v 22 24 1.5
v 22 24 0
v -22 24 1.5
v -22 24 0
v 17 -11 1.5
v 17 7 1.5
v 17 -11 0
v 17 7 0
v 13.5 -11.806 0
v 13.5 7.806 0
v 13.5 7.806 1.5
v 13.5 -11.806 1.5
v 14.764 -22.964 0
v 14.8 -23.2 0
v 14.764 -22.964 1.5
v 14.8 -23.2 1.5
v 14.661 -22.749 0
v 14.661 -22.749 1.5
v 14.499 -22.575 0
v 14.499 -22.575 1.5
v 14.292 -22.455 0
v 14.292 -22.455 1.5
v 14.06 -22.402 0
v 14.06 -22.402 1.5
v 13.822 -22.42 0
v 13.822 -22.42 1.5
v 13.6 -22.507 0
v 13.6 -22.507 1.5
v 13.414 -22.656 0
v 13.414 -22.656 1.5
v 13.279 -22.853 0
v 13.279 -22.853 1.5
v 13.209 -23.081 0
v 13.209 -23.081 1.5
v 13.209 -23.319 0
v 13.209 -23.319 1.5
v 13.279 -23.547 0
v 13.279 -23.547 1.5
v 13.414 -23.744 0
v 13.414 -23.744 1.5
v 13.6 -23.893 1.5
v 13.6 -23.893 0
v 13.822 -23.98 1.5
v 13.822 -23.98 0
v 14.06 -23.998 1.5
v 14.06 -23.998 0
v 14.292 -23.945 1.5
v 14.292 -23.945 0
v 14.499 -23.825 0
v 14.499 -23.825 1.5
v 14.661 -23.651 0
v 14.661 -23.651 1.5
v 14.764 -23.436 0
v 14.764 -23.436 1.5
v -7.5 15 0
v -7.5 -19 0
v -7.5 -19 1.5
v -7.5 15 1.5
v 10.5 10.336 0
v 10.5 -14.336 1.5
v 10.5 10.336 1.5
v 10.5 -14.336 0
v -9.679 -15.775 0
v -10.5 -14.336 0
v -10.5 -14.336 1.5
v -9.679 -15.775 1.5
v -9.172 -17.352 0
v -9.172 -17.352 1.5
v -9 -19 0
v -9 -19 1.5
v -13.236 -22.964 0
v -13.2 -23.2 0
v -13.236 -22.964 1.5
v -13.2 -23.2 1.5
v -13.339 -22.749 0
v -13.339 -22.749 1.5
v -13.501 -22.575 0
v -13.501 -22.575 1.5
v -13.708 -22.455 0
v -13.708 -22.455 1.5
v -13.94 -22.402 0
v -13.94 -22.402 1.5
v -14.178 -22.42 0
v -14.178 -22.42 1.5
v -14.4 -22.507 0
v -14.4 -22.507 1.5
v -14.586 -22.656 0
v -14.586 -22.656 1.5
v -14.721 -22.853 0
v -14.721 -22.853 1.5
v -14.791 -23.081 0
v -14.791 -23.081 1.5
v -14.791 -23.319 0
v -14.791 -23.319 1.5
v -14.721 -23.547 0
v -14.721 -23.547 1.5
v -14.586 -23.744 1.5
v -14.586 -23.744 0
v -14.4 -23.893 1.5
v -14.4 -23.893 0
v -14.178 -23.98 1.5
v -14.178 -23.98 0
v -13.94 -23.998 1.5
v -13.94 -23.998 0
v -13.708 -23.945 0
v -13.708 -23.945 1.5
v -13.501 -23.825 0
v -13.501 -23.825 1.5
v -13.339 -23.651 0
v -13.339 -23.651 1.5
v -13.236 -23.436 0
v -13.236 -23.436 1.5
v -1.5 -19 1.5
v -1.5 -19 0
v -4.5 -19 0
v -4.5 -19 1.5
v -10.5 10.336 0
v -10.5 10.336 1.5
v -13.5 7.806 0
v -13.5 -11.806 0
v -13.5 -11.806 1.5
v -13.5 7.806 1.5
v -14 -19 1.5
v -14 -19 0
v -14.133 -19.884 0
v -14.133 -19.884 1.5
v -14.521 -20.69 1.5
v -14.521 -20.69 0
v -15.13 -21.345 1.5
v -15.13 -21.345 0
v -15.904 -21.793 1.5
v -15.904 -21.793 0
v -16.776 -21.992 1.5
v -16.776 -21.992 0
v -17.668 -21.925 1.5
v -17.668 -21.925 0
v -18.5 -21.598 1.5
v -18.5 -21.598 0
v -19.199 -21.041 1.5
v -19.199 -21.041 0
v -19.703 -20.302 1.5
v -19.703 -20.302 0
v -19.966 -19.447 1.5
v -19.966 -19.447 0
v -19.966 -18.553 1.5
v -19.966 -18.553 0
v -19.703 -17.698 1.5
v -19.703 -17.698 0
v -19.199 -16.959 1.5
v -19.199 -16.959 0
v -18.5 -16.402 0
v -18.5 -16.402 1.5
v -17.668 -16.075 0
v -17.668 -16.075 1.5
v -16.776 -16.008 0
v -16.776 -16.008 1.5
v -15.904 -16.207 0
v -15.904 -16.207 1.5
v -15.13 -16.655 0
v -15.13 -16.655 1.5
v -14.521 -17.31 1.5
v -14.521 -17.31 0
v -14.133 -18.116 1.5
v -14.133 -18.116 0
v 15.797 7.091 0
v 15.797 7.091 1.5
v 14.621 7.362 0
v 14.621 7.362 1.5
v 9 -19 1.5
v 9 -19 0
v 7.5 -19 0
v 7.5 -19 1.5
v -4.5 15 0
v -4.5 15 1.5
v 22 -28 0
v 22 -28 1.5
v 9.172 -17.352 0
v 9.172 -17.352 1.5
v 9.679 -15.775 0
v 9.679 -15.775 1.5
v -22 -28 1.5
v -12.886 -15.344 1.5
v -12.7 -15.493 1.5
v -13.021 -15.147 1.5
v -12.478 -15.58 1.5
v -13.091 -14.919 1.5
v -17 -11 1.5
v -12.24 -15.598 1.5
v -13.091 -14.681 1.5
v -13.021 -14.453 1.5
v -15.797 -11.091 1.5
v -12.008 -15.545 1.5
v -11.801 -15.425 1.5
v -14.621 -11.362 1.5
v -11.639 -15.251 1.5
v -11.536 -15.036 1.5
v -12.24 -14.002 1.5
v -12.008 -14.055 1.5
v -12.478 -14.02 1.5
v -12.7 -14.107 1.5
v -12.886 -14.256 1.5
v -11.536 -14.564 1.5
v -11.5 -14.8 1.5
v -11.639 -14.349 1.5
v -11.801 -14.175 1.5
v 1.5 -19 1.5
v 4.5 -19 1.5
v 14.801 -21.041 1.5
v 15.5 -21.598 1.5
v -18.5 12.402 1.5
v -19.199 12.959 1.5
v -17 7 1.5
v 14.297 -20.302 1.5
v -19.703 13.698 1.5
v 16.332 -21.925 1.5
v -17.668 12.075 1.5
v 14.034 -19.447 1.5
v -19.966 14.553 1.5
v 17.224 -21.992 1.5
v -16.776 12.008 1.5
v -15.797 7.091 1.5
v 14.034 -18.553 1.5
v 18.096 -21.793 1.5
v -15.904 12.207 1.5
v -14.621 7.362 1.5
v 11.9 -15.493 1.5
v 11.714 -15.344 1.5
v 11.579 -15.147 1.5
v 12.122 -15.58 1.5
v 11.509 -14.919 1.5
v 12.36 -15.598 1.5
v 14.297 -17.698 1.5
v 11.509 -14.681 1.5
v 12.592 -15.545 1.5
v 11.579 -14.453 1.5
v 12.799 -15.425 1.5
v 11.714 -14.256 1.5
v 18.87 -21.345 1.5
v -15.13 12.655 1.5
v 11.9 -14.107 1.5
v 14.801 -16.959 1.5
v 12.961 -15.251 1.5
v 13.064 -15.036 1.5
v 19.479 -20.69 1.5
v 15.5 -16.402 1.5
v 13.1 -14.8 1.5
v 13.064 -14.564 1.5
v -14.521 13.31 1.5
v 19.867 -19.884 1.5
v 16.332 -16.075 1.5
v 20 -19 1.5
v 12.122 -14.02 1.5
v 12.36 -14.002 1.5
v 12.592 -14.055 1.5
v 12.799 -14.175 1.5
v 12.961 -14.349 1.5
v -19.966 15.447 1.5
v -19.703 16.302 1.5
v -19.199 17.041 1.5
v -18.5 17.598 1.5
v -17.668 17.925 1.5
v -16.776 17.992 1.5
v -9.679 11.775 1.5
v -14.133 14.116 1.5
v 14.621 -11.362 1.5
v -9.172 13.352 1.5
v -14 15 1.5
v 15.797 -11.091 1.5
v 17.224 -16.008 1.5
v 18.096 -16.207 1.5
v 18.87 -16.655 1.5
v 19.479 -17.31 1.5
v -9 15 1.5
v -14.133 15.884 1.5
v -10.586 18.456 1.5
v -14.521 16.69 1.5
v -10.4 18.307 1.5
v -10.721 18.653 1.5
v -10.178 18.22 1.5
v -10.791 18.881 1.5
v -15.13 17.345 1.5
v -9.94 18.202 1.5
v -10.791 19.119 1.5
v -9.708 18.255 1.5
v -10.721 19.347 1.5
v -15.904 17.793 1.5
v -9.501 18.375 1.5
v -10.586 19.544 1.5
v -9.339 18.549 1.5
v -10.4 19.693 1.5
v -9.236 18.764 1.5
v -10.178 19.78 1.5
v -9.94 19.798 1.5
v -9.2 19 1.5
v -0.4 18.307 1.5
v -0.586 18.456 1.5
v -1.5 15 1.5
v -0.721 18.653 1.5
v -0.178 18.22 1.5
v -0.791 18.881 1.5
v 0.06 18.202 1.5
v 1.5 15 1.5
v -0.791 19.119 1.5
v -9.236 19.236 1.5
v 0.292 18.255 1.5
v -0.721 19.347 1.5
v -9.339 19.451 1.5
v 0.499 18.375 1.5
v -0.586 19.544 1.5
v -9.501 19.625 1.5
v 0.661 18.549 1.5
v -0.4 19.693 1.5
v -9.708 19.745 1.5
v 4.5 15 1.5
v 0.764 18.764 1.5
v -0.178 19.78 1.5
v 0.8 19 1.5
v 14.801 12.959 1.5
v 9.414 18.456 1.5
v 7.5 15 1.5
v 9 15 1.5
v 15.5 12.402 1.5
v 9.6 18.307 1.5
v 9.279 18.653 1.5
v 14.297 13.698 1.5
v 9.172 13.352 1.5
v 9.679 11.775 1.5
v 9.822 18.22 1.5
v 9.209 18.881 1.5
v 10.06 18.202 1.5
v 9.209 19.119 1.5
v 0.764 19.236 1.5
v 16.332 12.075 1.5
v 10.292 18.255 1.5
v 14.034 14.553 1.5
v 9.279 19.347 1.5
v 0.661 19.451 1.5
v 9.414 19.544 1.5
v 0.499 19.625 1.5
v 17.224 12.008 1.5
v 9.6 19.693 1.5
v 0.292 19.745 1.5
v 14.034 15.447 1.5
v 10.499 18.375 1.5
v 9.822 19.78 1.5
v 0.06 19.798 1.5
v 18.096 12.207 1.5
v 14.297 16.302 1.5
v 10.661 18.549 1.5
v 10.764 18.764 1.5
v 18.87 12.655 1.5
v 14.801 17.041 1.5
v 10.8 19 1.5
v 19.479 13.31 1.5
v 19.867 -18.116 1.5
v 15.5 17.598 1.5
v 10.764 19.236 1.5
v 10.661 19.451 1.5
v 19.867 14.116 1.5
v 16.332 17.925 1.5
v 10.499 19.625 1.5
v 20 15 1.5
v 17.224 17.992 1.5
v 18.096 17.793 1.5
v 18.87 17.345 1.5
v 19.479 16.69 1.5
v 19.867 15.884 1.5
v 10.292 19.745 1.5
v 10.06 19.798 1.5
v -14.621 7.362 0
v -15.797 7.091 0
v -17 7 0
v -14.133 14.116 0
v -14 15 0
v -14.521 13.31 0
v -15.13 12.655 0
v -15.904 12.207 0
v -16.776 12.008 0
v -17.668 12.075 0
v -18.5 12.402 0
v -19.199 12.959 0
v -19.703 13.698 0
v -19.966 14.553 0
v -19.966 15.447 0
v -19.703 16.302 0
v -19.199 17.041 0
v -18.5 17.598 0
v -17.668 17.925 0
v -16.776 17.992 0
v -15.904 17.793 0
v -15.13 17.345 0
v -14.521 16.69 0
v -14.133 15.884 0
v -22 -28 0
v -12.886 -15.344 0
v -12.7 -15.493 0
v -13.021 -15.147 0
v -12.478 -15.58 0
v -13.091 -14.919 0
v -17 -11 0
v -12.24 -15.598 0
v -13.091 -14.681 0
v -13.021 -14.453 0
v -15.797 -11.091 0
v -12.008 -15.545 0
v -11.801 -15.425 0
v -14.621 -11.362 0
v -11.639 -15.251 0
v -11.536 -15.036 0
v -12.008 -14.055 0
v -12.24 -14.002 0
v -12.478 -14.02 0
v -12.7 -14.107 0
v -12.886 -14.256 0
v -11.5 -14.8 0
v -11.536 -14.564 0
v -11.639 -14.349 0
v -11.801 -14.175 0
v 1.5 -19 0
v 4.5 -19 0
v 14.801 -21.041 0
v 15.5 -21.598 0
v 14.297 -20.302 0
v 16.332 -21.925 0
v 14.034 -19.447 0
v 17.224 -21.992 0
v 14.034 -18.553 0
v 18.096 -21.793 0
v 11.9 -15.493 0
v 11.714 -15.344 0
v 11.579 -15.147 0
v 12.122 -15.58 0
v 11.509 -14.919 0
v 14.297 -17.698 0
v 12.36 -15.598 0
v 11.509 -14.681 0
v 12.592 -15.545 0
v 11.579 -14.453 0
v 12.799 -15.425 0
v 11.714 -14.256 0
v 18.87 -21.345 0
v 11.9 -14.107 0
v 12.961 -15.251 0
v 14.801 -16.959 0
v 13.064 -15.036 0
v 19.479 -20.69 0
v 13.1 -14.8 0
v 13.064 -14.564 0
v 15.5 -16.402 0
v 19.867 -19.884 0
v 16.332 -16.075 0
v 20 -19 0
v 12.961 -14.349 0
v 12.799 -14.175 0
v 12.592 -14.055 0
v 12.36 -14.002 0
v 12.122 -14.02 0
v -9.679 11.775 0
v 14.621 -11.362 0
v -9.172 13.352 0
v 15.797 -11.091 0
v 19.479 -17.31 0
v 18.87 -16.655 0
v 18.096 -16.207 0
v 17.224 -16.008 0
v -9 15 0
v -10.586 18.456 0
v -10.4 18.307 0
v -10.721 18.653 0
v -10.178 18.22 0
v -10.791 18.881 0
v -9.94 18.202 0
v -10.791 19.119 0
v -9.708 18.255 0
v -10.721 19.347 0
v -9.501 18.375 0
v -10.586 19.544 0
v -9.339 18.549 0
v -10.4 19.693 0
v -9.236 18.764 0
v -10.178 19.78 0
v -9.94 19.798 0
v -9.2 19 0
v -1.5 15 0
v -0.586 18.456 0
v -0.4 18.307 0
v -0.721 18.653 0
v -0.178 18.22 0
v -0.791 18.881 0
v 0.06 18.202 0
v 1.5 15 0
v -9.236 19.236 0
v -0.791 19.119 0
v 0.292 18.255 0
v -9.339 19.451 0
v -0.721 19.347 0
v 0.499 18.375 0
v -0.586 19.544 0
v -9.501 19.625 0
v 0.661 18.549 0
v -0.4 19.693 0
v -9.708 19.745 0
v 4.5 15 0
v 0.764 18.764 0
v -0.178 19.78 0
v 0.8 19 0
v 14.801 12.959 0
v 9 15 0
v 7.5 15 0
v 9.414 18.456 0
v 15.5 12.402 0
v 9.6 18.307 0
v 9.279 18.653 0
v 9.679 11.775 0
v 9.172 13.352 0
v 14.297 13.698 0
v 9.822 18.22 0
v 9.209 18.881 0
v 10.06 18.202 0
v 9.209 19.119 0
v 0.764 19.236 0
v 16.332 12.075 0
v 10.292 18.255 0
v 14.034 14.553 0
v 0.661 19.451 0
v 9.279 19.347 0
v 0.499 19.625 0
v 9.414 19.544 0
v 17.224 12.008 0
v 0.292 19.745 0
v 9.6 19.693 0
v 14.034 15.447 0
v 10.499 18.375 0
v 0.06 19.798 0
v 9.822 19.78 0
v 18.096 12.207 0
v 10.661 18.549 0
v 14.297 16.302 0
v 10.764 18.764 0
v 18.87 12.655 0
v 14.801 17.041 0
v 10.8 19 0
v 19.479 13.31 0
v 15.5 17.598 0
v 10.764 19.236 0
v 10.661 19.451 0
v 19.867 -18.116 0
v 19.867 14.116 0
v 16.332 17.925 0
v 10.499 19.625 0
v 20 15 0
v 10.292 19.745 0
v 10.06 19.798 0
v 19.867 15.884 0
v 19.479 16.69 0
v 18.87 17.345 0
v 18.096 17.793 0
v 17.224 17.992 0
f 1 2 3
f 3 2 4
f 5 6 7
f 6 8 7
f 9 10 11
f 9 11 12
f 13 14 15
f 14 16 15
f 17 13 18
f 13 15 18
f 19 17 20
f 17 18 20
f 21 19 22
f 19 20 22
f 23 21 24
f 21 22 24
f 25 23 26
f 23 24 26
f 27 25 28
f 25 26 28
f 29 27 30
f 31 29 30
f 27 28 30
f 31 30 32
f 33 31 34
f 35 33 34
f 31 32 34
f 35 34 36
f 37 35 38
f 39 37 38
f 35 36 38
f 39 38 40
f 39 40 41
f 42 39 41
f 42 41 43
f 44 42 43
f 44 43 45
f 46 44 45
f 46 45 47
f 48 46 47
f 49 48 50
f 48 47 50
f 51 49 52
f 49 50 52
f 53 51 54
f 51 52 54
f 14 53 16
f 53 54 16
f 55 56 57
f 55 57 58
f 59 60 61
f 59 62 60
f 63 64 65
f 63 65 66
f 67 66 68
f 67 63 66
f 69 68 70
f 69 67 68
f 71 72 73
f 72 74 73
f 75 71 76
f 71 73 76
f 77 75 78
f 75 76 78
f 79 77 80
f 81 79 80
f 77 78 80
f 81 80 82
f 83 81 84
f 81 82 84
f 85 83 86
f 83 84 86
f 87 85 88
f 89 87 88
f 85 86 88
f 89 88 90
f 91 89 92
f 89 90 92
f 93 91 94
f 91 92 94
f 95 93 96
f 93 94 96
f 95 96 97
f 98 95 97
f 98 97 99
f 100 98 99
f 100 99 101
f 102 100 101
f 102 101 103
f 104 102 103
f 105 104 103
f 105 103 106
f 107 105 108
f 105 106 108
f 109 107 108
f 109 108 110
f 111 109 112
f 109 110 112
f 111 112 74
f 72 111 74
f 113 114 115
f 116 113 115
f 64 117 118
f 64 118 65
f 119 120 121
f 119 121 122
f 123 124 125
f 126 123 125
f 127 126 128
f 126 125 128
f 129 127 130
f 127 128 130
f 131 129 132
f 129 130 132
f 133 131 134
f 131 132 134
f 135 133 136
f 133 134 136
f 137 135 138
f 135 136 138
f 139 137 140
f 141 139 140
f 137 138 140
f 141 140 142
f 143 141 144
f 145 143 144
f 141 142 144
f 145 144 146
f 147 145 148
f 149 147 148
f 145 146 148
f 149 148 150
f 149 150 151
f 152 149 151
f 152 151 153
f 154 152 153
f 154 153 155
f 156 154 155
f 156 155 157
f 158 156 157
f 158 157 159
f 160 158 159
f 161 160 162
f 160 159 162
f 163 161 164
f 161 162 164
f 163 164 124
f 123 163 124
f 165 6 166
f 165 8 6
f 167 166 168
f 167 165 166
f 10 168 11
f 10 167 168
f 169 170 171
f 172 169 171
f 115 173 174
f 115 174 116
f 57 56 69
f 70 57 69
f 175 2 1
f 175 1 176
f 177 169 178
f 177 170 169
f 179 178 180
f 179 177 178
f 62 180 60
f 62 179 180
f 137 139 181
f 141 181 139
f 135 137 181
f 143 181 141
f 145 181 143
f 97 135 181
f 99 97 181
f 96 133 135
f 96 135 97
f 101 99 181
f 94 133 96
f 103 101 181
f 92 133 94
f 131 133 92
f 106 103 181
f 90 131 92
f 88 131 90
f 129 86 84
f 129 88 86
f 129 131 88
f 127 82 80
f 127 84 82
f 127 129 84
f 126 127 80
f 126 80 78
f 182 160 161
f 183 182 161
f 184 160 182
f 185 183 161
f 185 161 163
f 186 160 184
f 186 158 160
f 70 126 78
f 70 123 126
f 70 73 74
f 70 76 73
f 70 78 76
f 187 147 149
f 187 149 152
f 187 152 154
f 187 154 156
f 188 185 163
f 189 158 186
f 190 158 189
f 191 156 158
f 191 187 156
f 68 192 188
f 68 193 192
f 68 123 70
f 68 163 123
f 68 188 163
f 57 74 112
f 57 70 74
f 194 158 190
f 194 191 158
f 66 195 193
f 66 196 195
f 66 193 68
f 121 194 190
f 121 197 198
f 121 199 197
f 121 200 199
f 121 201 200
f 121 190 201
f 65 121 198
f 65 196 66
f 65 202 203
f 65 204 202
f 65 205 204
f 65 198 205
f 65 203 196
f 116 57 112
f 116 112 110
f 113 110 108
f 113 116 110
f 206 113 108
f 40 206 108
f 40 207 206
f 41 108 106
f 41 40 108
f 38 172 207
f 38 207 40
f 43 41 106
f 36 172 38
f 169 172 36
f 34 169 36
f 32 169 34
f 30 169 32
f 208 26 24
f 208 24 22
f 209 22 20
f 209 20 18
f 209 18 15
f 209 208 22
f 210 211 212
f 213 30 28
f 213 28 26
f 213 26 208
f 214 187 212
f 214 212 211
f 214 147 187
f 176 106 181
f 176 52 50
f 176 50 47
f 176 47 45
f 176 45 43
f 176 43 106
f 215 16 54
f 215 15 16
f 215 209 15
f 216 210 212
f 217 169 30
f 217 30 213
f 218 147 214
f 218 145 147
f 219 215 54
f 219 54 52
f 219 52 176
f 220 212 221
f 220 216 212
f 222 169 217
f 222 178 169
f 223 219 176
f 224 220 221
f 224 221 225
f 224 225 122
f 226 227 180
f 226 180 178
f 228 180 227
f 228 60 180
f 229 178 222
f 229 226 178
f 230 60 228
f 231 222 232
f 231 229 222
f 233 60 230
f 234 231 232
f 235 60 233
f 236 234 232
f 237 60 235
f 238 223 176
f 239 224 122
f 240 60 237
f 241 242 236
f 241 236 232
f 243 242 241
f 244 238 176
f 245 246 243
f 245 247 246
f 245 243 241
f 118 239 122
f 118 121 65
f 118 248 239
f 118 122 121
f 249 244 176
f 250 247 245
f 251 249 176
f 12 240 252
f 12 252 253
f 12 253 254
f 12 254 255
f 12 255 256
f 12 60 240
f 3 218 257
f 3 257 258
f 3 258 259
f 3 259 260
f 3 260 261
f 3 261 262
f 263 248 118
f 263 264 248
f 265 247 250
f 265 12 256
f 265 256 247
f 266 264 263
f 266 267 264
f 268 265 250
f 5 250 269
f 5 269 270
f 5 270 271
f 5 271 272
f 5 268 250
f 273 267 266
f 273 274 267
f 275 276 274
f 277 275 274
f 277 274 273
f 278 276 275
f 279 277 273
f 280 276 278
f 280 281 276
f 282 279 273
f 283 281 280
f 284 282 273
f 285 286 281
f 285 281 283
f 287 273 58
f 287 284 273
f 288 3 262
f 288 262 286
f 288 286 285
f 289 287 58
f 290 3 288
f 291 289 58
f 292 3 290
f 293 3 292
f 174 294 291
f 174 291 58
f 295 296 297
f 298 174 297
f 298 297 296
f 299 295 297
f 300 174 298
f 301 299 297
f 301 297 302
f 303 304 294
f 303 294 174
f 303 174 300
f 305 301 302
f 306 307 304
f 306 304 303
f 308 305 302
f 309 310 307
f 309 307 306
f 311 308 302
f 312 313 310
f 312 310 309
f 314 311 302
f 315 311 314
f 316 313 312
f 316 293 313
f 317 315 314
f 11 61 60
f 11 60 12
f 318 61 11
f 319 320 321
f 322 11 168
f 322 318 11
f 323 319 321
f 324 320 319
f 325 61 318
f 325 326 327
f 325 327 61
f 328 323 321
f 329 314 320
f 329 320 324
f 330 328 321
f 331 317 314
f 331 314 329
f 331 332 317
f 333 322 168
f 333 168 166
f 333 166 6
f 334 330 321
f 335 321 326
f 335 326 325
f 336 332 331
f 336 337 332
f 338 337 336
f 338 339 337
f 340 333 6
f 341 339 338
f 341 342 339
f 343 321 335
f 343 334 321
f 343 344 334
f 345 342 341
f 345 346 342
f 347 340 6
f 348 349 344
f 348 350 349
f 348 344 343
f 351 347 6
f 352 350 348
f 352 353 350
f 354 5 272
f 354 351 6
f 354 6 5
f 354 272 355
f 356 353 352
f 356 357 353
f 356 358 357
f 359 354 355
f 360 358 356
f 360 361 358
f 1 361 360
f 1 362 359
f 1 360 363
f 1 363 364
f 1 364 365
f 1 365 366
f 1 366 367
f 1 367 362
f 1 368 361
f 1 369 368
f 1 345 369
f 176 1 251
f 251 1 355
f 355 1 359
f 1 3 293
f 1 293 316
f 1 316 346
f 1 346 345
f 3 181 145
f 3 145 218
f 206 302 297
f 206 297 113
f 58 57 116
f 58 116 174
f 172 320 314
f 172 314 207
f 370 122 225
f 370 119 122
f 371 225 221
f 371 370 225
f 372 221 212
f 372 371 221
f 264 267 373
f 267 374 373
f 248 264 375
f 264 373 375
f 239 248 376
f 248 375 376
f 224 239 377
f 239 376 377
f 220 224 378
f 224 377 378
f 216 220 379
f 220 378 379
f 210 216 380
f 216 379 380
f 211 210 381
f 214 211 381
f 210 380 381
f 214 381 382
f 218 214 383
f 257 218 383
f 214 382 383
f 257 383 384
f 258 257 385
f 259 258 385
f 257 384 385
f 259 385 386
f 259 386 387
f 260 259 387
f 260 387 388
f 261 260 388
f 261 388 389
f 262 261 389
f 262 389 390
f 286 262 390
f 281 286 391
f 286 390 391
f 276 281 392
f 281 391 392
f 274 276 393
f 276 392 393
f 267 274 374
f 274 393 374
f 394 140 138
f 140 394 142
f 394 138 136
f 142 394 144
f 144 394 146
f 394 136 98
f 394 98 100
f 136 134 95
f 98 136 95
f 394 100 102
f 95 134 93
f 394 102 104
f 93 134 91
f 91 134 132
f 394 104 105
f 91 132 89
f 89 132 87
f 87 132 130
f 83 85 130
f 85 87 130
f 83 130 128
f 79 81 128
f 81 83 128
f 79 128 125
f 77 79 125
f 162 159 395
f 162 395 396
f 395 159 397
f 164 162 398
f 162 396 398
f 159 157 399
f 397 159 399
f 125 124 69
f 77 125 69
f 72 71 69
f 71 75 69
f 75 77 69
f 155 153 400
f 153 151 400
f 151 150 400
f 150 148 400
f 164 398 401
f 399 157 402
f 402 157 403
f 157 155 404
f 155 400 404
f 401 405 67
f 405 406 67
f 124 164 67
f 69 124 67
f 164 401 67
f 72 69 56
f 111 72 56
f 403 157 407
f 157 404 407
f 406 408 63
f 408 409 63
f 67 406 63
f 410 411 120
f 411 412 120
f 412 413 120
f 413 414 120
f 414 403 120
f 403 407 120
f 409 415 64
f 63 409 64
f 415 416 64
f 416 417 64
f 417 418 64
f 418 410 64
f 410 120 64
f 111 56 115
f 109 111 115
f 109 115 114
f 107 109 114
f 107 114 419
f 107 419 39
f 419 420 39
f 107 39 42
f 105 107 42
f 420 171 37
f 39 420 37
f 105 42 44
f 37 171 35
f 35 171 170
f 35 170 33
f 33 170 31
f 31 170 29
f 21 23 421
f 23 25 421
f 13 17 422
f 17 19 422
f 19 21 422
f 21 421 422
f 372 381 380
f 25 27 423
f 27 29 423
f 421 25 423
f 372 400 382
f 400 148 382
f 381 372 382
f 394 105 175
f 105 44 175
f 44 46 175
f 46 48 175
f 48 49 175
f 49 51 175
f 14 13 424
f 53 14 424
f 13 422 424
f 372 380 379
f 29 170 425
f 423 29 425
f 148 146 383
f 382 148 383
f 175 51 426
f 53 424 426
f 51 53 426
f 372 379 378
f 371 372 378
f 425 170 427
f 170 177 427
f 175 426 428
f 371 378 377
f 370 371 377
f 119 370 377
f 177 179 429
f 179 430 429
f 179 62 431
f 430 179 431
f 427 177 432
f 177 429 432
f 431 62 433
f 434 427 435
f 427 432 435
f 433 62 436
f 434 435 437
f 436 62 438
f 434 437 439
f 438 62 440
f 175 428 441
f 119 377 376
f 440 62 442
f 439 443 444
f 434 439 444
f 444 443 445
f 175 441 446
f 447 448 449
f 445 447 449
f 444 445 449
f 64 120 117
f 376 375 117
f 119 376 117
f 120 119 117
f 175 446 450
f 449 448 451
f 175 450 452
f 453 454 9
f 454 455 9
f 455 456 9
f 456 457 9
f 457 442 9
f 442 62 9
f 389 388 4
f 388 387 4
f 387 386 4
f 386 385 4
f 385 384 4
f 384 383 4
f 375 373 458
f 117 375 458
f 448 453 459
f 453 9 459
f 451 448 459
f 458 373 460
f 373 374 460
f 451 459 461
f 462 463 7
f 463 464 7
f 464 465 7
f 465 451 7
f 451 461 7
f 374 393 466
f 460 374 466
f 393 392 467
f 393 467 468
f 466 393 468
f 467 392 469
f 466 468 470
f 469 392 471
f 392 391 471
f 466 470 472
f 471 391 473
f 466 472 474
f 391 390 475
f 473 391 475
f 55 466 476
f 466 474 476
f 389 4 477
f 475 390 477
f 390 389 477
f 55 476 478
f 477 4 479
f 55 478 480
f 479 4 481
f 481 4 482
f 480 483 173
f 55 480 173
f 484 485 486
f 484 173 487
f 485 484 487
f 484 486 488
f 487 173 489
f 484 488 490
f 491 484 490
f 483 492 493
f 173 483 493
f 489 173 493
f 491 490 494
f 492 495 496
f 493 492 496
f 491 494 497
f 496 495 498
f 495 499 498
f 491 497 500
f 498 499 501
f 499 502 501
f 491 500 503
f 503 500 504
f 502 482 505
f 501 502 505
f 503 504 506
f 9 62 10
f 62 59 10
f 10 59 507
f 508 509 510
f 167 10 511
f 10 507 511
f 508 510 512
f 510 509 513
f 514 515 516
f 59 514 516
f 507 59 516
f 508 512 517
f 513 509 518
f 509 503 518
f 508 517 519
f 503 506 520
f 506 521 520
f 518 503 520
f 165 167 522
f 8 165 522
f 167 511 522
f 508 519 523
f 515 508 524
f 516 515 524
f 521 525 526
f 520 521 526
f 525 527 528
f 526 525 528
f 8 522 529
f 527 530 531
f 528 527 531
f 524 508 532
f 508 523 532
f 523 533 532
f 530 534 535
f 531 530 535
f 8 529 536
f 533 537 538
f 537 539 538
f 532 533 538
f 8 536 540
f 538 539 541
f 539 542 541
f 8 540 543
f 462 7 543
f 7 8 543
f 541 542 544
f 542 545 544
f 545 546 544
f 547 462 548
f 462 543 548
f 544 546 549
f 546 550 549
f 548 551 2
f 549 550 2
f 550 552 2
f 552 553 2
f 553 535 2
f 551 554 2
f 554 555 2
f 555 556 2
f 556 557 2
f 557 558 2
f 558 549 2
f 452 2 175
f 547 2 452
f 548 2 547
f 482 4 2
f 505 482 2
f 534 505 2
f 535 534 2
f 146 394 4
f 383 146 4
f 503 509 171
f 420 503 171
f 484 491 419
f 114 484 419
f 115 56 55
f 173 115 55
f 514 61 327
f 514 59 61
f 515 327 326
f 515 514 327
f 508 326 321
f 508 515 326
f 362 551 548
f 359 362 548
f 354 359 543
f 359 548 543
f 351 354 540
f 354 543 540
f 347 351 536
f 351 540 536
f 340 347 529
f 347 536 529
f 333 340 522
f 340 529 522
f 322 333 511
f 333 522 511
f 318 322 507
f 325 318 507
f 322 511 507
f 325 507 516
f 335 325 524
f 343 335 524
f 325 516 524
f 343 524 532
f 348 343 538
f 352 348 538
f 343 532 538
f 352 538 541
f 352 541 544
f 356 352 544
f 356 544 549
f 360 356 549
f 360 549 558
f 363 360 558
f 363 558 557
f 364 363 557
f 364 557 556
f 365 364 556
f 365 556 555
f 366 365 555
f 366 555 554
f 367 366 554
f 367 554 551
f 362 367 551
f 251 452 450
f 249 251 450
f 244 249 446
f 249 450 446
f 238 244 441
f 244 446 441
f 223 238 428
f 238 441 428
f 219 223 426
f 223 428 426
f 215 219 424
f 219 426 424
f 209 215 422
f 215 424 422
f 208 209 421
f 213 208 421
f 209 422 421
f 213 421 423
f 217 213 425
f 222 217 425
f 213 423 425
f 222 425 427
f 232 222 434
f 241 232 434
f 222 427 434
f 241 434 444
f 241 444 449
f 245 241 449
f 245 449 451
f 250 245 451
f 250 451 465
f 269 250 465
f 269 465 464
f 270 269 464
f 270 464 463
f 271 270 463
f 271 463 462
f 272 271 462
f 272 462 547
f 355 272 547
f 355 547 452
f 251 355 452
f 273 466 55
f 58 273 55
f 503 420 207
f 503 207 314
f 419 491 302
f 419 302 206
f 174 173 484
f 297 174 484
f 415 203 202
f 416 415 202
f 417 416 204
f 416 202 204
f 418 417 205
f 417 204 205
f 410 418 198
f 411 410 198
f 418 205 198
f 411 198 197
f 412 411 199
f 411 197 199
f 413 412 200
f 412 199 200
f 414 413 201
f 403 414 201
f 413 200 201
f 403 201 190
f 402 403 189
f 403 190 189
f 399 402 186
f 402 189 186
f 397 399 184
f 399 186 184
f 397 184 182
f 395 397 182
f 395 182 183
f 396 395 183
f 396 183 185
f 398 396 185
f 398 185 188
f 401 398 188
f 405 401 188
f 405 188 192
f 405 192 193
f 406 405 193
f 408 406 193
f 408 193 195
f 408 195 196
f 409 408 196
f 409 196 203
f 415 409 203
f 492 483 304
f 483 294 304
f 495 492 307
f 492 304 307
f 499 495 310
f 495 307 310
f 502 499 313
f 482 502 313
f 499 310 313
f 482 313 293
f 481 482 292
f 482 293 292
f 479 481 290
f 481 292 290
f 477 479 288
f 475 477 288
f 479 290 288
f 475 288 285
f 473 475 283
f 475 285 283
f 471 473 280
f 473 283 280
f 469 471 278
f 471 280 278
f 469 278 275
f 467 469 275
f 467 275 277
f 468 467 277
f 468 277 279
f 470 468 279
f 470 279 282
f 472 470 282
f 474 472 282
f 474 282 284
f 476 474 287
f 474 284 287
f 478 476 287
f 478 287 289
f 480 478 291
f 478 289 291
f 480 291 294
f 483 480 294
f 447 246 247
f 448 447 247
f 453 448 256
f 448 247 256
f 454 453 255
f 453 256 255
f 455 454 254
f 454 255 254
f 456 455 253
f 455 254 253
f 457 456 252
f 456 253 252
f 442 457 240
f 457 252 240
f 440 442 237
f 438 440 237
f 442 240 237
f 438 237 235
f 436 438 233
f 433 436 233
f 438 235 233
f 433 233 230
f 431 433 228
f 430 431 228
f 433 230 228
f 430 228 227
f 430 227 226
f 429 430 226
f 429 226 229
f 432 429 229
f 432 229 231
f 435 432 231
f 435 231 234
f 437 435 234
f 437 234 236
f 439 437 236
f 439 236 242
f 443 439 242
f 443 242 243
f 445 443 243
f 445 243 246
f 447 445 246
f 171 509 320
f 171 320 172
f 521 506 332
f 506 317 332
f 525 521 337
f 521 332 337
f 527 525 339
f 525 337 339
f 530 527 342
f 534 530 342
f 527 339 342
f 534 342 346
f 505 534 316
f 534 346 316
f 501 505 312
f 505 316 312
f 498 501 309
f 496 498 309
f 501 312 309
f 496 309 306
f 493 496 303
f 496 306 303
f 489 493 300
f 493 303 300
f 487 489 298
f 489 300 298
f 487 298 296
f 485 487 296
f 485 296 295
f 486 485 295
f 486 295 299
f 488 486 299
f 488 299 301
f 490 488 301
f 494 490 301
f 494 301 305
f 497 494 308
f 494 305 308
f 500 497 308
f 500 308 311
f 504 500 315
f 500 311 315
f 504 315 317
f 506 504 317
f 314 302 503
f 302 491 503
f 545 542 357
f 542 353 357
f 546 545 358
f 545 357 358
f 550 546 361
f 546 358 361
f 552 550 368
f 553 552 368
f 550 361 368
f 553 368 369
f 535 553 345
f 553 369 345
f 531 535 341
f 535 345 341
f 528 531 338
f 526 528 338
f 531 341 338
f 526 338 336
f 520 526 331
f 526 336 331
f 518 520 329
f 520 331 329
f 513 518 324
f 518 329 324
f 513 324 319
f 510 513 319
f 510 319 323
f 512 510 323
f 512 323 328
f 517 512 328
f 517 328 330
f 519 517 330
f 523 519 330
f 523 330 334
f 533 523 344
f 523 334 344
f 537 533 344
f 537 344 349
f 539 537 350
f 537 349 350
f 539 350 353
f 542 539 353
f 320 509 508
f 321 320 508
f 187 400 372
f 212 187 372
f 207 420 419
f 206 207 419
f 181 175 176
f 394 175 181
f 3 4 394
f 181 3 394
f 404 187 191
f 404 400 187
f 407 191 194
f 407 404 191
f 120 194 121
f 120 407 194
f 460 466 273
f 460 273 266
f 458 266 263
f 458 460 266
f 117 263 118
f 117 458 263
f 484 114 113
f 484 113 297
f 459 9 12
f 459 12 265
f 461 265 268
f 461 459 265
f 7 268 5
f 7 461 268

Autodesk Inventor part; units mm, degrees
ref_plane "YZ Plane" through (0, 0, 0) normal (1, 0, 0) x (0, 1, 0)
ref_plane "XZ Plane" through (0, 0, 0) normal (0, 1, 0) x (-1, 0, 0)
ref_plane "XY Plane" through (0, 0, 0) normal (0, 0, 1) x (1, 0, 0)
sketch "スケッチ1" plane through (0, 0, 0) normal (0, 0, 1) x (1, 0, 0)
  line L0 (-22, -24) -> (22, -24)
  line L1 (22, -24) -> (22, 24)
  line L2 (22, 24) -> (-22, 24)
  line L3 (-22, 24) -> (-22, -24)
  line L4 (-22, -24) -> (22, 24) construction
  line L5 (22, -24) -> (-22, 24) construction
  line L6 (-17, 15) -> (17, 15)
  line L7 (17, 15) -> (17, -19)
  line L8 (17, -19) -> (-17, -19)
  line L9 (-17, -19) -> (-17, 15)
  circle A0 centre (-17, 15) radius 3
  circle A1 centre (17, 15) radius 3
  circle A2 centre (17, -19) radius 3
  circle A3 centre (-17, -19) radius 3
  circle A4 centre (-17, 15) radius 8
  circle A5 centre (17, 15) radius 8
  circle A6 centre (17, -19) radius 8
  circle A7 centre (-17, -19) radius 8
  line L10 (-22, -24) -> (22, -24)
  line L11 (22, -24) -> (22, -28)
  line L12 (22, -28) -> (-22, -28)
  line L13 (-22, -28) -> (-22, -24)
  line L14 (-1.5, 15) -> (1.5, 15)
  line L15 (1.5, 15) -> (1.5, -19)
  line L16 (1.5, -19) -> (-1.5, -19)
  line L17 (-1.5, -19) -> (-1.5, 15)
  line L18 (7.5, 15) -> (7.5, -19)
  line L19 (4.5, -19) -> (4.5, 15)
  line L20 (13.5, 15) -> (13.5, -19)
  line L21 (10.5, -19) -> (10.5, 15)
  line L22 (-4.5, 15) -> (-4.5, -19)
  line L23 (-7.5, -19) -> (-7.5, 15)
  line L24 (1.5, 15) -> (1.5, -19)
  line L25 (-1.5, -19) -> (-1.5, 15)
  line L26 (7.5, 15) -> (7.5, -19)
  line L27 (4.5, -19) -> (4.5, 15)
  line L28 (-10.5, 15) -> (-10.5, -19)
  line L29 (-13.5, -19) -> (-13.5, 15)
  line L30 (-4.5, 15) -> (-4.5, -19)
  line L31 (-7.5, -19) -> (-7.5, 15)
  line L32 (1.5, 15) -> (1.5, -19)
  line L33 (-1.5, -19) -> (-1.5, 15)
  point P0 (0, 0)
  point P1 (-9, 15)
  point P2 (9, 15)
  point P3 (17, 7)
  point P4 (17, -11)
  point P5 (9, -19)
  point P6 (-9, -19)
  point P7 (-17, -11)
  point P8 (-17, 7)
  point P9 (22, -24)
  point P10 (0, 15)
  point P11 (-13.5, 7.8063)
  point P12 (-13.5, -11.8063)
  point P13 (-10.5, -14.3363)
  point P14 (-10.5, 10.3363)
  point P15 (10.5, 10.3363)
  point P16 (10.5, -14.3363)
  point P17 (13.5, -11.8063)
  point P18 (13.5, 7.8063)
  dimension "d0" = 48
  dimension "d1" = 44
  dimension "d2" = 34
  dimension "d3" = 5
  dimension "d4" = 5
  dimension "d5" = 6
  dimension "d6" = 16
  dimension "d11" = 4
  dimension "d12" = 3
  dimension "d15" = 6
  dimension "d18" = 6
extrude "プレート1" add sketch "スケッチ1" along normal blind 1.5 contours L3 A7 L9 A3 L8 L0 | L0 A7 L13 | A7 L8 A6 L0 | L0 A6 L11 L12 L13 A7 | L3 A4 L9 A7 | A6 L8 A2 L7 L1 L0 | L0 L11 A6 | L8 L28 A7 | L3 A4 L6 A0 L9 | A7 L29 L8 A3 L9 | A6 L21 L8 | L23 L6 L22 L8 | L8 L29 A7 L28 | A7 L29 A4 L28 | L3 L2 L1 A5 L6 A4 | L9 A0 L6 L29 A4 | A6 L7 A5 L1 | L21 A6 L20 L8 | L8 L19 L6 L18 | L21 A5 L20 A6 | L28 L6 A4 | A4 L29 L6 L28 | A5 L7 A1 L6 L1 | L7 A2 L8 L20 A6 | L21 L6 L20 A5 | A5 L6 L21 | L17 L6 L15 L8 | A5 L20 L6 A1 L7
sketch "スケッチ2" plane through (0, 0, 1.5) normal (0, 0, 1) x (1, 0, 0)
  line L0 (11.5, -21.5) -> (11.5, -14.8) projected
  line L1 (11.5, -21.5) -> (12, -21.5) projected
  line L2 (12, -21.5) -> (12, -24) projected
  line L3 (18, -24) -> (14, -24) projected
  line L4 (18, -14) -> (18, -24) construction
  line L5 (12.3, -14) -> (18, -14) projected
  circle A0 centre (12.3, -14.8) radius 0.8
  circle A1 centre (14, -23.2) radius 0.8
  line L6 (0, 0) -> (0, -10)
  circle A2 centre (-12.3, -14.8) radius 0.8
  circle A3 centre (-14, -23.2) radius 0.8
  arc A4 (11.5, -14.8) -> (12.3, -14) centre (12.3, -14.8) ccw projected
  line L7 (14, -24) -> (12, -24) projected
  circle A5 centre (14, -23.2) radius 0.8 projected
  dimension "d21" = 1.6
  dimension "d22" = 1.6
  dimension "d25" = 2
extrude "切り取り1" cut sketch "スケッチ2" against normal blind 1.5
sketch "スケッチ3" plane through (0, 0, 1.5) normal (0, 0, 1) x (1, 0, 0)
  circle A0 centre (0, 19) radius 0.8
  circle A1 centre (-10, 19) radius 0.8
  circle A2 centre (10, 19) radius 0.8
  line L0 (-22, 24) -> (22, 24) projected
  point P0 (0, 0)
  point P1 (0, 24)
  dimension "d26" = 1.6
  dimension "d27" = 1.6
  dimension "d28" = 1.6
  dimension "d29" = 5
  dimension "d30" = 10
  dimension "d31" = 10
extrude "切り取り2" cut sketch "スケッチ3" against normal blind 1.5
equation "\"d4\" = d3"
equation "\"d23\" = Thickness"
equation "\"d32\" = Thickness"
equation "\"d10\" = Thickness"
equation "\"BendRadius\" = Thickness"
equation "\"BendReliefWidth\" = Thickness"
equation "\"BendReliefDepth\" = 0.5 * Thickness"
equation "\"CornerReliefSize\" = 4 * Thickness"
equation "\"MinimumRemnant\" = 2 * Thickness"
equation "\"TransitionRadius\" = BendRadius"
equation "\"JacobiRadiusSize\" = BendRadius"
equation "\"GapSize\" = Thickness"
equation "\"Thickness\" = 1.5"
properties part number "board_setter_base" material "アルミニウム 6061"
